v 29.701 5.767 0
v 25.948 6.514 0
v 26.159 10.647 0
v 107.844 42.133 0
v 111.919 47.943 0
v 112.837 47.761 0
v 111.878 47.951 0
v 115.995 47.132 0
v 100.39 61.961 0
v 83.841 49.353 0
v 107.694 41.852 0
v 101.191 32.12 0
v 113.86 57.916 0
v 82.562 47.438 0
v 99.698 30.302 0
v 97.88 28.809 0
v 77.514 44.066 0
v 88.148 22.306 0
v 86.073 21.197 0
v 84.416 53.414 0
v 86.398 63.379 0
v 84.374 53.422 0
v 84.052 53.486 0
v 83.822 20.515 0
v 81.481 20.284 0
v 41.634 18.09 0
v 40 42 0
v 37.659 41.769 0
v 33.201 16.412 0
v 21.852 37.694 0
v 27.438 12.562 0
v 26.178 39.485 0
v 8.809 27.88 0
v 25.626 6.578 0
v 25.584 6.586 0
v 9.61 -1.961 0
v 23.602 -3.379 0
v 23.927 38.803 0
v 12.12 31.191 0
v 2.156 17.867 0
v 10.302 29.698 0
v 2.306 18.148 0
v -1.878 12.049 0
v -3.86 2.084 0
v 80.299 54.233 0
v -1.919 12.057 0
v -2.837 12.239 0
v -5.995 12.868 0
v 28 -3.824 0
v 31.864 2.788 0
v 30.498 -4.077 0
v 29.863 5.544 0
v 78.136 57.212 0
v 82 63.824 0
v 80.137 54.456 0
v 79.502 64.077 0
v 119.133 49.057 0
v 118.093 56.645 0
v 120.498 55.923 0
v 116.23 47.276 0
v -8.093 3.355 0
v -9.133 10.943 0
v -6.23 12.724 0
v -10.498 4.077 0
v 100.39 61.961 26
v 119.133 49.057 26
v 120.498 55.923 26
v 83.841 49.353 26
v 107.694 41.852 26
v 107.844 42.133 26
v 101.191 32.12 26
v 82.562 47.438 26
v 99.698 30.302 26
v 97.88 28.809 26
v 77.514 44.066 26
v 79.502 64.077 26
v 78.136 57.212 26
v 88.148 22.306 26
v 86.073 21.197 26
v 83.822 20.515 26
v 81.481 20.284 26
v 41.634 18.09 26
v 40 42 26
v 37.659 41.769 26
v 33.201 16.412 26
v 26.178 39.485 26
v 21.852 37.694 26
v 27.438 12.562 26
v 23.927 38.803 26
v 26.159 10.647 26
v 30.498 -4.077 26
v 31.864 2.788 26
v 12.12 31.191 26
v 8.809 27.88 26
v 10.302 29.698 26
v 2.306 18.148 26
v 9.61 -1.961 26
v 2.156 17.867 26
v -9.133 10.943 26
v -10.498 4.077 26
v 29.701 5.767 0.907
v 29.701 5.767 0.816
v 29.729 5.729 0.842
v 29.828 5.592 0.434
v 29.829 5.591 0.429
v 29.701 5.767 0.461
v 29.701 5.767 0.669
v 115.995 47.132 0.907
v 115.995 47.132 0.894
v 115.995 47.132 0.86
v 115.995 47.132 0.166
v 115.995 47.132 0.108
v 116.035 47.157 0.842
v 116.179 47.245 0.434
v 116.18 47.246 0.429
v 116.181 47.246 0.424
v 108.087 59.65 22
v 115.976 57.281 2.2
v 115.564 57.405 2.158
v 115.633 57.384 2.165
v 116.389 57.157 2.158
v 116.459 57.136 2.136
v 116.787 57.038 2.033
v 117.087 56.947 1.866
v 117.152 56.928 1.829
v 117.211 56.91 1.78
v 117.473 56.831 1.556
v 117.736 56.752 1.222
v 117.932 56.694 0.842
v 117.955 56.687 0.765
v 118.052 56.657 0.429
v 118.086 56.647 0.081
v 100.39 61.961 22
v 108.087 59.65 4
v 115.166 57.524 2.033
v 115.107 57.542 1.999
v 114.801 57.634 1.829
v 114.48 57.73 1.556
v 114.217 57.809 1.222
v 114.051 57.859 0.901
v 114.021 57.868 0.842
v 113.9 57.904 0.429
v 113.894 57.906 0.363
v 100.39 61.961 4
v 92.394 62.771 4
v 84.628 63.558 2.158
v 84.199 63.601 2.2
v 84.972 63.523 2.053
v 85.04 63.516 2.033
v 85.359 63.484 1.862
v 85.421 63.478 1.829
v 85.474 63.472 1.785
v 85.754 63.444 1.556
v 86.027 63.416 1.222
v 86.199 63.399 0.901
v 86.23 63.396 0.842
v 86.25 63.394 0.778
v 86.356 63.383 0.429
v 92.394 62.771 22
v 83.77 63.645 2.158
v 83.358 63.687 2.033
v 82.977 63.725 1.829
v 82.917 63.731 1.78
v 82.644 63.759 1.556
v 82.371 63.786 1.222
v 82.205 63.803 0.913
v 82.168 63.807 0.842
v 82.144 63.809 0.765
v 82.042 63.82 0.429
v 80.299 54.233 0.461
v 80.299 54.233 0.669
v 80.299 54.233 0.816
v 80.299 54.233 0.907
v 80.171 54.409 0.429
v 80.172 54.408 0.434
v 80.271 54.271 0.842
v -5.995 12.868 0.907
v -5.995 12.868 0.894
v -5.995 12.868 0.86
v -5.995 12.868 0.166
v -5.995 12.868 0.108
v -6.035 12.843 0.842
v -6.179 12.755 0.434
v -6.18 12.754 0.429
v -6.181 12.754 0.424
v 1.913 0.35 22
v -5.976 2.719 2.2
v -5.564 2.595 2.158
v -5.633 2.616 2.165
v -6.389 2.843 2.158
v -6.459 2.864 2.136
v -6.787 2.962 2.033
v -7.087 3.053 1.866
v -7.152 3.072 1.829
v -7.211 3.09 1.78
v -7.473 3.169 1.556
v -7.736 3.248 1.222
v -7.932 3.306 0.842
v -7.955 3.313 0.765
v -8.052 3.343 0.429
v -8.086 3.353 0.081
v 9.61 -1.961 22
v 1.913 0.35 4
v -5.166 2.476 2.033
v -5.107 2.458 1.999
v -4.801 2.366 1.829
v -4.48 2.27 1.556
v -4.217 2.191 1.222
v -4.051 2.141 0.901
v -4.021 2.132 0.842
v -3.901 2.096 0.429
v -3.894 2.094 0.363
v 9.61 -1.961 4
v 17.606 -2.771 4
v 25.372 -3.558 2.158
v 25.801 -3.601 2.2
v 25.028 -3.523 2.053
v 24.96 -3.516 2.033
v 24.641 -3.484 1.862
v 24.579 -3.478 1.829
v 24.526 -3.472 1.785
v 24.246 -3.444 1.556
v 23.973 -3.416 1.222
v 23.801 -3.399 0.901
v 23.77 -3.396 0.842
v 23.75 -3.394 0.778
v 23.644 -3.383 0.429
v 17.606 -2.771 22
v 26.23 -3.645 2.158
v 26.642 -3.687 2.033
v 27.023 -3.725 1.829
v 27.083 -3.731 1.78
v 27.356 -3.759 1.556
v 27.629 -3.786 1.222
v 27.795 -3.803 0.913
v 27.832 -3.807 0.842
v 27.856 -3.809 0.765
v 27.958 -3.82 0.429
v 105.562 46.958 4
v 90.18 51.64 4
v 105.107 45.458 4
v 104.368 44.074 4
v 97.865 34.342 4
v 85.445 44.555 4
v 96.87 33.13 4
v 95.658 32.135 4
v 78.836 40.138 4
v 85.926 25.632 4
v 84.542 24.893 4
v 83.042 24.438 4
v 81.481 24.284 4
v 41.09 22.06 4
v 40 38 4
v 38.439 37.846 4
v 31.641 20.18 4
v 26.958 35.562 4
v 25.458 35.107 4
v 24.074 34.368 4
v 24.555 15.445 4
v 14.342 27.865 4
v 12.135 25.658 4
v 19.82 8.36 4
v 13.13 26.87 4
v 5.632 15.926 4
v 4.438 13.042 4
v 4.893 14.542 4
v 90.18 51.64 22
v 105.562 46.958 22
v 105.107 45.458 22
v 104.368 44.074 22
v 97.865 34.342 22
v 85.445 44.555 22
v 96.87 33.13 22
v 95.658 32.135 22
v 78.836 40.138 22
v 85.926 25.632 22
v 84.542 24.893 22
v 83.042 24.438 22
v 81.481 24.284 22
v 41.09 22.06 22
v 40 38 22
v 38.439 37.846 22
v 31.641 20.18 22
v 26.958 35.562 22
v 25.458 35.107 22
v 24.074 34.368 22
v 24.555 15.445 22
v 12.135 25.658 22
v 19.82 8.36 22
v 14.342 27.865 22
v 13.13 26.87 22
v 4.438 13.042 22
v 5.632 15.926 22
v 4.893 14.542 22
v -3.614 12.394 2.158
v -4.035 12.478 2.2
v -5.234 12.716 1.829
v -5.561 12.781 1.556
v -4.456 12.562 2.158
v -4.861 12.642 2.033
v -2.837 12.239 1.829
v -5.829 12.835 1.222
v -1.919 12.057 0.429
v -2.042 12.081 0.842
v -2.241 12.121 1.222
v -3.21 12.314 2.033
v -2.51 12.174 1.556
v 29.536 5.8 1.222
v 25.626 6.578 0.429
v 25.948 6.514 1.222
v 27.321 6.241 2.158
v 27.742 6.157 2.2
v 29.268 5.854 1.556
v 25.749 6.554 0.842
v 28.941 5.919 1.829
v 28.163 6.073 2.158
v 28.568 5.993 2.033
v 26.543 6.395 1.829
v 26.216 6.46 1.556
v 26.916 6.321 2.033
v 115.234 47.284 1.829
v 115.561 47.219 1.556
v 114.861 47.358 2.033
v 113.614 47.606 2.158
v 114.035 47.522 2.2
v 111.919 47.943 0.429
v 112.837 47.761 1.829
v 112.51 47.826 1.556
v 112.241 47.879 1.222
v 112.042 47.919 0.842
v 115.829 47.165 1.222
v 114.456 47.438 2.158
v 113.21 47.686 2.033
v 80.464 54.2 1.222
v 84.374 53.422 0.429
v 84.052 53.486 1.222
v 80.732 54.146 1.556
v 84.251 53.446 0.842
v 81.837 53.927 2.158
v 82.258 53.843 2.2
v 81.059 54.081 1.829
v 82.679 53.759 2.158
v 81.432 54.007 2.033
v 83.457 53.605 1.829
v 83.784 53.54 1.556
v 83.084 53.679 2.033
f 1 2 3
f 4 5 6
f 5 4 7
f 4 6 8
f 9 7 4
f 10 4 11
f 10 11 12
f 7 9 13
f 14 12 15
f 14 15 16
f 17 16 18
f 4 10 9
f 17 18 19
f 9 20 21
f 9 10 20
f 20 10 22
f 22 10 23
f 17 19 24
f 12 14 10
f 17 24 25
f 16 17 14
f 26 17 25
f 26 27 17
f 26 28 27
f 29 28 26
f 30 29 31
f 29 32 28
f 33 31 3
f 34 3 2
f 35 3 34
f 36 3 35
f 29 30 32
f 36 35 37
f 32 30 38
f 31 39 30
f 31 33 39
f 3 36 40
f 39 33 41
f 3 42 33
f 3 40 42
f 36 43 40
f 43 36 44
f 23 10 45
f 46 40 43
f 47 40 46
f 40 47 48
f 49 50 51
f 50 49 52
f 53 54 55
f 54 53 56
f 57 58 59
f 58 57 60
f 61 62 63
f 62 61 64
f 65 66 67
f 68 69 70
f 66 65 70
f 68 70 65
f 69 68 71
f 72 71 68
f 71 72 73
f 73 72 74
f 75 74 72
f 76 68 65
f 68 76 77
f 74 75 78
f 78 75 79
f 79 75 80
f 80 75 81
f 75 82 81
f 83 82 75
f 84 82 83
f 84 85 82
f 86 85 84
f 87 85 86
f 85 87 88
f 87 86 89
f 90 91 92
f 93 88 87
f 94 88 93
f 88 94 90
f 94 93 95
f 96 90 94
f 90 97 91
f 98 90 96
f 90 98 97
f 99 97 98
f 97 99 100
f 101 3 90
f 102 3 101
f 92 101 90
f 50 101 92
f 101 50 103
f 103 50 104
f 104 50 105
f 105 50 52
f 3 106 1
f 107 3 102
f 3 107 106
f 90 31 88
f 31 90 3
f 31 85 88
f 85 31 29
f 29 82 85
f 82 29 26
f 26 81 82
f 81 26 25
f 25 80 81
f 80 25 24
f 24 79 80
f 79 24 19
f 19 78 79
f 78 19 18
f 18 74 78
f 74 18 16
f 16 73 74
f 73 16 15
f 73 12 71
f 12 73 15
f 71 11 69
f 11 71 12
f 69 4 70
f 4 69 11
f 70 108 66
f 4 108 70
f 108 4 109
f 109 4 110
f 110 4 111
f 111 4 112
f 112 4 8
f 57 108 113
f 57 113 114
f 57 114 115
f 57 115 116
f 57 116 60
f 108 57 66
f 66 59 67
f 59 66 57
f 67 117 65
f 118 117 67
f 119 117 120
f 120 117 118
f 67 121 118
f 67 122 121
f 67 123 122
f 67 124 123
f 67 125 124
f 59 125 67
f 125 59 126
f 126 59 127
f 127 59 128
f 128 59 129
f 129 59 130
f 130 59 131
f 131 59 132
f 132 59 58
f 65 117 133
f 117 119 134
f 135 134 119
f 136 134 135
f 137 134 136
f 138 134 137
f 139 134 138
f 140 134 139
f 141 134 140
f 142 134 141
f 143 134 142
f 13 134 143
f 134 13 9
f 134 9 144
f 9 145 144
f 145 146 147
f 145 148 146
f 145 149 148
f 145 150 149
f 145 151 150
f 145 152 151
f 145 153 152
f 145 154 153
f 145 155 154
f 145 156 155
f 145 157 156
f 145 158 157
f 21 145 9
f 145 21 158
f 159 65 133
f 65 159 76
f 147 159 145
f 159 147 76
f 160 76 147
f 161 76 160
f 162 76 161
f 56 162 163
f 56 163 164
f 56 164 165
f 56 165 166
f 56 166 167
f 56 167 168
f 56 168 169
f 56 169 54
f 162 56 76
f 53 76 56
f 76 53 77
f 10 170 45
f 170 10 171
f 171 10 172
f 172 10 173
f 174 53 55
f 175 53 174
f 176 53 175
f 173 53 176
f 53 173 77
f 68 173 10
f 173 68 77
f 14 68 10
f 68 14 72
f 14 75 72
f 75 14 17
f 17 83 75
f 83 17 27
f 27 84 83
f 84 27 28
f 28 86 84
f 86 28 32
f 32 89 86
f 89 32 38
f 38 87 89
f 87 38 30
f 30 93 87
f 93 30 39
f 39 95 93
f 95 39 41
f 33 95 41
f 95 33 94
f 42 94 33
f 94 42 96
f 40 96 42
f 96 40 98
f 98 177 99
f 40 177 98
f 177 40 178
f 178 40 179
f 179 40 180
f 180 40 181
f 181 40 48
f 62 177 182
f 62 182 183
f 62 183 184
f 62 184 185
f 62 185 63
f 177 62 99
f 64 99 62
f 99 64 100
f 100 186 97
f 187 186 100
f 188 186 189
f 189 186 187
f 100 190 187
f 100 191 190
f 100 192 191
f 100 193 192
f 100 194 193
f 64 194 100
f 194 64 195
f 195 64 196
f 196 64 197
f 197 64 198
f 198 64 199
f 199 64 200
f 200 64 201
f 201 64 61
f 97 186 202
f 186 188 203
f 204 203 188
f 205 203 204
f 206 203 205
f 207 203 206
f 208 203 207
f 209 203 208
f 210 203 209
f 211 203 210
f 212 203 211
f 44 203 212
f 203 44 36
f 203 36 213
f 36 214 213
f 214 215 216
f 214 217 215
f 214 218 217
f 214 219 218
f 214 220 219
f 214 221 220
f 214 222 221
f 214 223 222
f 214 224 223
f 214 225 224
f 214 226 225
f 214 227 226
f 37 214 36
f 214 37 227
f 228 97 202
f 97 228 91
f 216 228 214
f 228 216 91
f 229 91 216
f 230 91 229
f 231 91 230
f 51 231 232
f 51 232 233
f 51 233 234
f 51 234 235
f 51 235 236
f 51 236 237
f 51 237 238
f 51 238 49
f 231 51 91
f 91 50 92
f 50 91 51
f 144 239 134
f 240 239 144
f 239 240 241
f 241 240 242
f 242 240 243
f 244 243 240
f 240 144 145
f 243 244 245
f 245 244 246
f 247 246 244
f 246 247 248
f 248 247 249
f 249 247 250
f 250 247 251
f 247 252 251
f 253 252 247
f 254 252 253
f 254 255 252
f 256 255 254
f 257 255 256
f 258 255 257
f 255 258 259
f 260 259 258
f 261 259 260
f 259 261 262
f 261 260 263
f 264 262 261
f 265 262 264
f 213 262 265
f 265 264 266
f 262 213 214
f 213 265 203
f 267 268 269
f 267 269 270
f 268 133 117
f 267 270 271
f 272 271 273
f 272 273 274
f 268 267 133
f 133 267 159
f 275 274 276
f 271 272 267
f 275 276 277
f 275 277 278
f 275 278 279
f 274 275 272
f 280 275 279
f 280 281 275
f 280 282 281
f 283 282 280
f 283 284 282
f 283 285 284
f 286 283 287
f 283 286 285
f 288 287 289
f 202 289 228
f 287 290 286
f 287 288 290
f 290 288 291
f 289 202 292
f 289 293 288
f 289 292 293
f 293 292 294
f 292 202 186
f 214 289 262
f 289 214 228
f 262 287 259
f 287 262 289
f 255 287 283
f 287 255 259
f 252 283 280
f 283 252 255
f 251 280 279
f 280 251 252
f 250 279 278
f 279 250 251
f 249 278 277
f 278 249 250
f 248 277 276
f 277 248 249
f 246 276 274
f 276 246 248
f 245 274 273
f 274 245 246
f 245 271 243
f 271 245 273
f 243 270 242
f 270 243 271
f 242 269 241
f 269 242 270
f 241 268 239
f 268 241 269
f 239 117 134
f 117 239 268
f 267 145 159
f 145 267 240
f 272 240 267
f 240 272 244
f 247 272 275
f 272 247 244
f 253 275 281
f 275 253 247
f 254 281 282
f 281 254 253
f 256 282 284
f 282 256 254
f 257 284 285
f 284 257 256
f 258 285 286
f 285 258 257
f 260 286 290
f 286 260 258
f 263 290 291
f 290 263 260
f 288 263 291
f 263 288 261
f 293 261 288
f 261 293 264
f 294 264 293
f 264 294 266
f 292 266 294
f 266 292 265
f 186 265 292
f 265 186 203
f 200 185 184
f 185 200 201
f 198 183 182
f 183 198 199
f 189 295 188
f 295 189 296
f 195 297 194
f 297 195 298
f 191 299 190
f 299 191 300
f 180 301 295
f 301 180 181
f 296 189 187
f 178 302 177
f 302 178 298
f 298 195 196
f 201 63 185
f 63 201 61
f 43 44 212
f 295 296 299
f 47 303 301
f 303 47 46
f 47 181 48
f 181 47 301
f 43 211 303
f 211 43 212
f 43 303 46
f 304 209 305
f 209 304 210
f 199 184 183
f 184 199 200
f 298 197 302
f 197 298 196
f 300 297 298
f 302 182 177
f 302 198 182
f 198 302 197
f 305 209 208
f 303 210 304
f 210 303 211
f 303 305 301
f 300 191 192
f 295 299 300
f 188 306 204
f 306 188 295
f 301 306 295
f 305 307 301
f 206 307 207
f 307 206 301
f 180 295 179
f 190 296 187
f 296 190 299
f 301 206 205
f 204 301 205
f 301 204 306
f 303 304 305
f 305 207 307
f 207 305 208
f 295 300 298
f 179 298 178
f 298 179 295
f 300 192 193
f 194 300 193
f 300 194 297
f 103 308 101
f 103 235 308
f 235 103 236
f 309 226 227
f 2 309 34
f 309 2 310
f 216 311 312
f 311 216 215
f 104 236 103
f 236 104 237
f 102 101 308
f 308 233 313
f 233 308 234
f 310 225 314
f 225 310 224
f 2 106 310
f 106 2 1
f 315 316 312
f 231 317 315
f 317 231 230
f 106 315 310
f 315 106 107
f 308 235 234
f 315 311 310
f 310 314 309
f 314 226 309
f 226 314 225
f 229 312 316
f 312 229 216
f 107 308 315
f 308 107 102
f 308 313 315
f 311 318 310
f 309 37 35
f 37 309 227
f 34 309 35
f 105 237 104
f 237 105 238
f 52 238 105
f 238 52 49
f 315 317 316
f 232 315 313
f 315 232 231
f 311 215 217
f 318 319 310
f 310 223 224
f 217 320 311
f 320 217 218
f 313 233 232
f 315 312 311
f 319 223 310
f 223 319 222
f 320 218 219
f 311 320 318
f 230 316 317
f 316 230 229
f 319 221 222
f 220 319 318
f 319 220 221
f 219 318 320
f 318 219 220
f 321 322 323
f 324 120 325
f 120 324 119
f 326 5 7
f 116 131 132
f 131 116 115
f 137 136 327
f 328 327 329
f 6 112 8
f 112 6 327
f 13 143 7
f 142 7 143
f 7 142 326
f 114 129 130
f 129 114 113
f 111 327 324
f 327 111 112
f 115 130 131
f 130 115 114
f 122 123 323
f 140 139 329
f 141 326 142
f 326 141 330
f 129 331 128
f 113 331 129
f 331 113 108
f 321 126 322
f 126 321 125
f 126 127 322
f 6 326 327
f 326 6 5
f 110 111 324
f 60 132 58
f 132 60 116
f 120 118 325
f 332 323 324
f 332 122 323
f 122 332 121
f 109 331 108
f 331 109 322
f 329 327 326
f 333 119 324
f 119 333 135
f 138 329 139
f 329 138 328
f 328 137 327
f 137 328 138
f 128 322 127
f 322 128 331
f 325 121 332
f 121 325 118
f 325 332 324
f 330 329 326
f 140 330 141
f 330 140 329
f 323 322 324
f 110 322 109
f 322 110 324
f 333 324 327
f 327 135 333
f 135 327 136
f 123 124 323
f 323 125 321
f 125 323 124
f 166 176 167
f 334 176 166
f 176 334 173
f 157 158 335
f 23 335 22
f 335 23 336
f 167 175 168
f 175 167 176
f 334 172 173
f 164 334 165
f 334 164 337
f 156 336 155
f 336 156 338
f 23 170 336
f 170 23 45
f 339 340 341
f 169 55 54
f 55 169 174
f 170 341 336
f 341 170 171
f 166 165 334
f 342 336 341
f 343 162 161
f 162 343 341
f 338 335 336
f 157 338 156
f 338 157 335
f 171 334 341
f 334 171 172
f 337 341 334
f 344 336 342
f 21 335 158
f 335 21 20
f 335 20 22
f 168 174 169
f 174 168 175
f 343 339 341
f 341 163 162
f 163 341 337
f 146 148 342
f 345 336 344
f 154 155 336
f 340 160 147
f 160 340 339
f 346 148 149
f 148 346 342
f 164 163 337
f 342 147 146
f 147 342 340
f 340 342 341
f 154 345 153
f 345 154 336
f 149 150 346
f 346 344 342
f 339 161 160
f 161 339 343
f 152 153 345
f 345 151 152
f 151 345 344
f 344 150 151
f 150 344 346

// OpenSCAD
$fn = 32;

// ----------------------------------------------------------------------
// Air duct: 24 mm duct, 4 mm wall, 26 mm across
// ----------------------------------------------------------------------

// --- parameters (mm) ---
duct_r = 12;              // duct core radius
duct_d = 24;              // duct core diameter
wall = 4;                 // duct wall thickness
height = 26;              // duct width (extrusion height)
port_r = 20.9;            // port flange half width
port_d = 41.8;            // port flange width
port_t = 7;               // port flange thickness
bolt_d = 4.4;             // port bolt holes
bolt_offset = 16.2;       // bolt hole offset from the port axis

difference() {
  /* outer hull chain: tube with a flat flange plate at every port */
  linear_extrude(height = 26) {
    hull() {
      polygon([[30.498, -4.077], [-10.498, 4.077], [-9.133, 10.943], [31.864, 2.788]]);
      translate([11.951, 9.808]) circle(r = 12);
    }
    hull() {
      translate([11.951, 9.808]) circle(r = 12);
      translate([12.284, 11.481]) circle(r = 12);
    }
    hull() {
      translate([12.284, 11.481]) circle(r = 12);
      translate([18.787, 21.213]) circle(r = 12);
    }
    hull() {
      translate([18.787, 21.213]) circle(r = 12);
      translate([28.519, 27.716]) circle(r = 12);
    }
    hull() {
      translate([28.519, 27.716]) circle(r = 12);
      translate([40, 30]) circle(r = 12);
    }
    hull() {
      translate([40, 30]) circle(r = 12);
      translate([81.481, 32.284]) circle(r = 12);
    }
    hull() {
      translate([81.481, 32.284]) circle(r = 12);
      translate([91.213, 38.787]) circle(r = 12);
    }
    hull() {
      translate([91.213, 38.787]) circle(r = 12);
      translate([97.716, 48.519]) circle(r = 12);
    }
    hull() {
      translate([97.716, 48.519]) circle(r = 12);
      translate([98.049, 50.192]) circle(r = 12);
    }
    hull() {
      translate([98.049, 50.192]) circle(r = 12);
      polygon([[79.502, 64.077], [120.498, 55.923], [119.133, 49.057], [78.136, 57.212]]);
    }
  }
  /* air passage: the same chain inset by the wall, 5 mm proud of the ports */
  translate([0, 0, 4]) linear_extrude(height = 18) {
    hull() {
      translate([9.025, -4.904]) circle(r = 8);
      translate([12.284, 11.481]) circle(r = 8);
    }
    hull() {
      translate([12.284, 11.481]) circle(r = 8);
      translate([18.787, 21.213]) circle(r = 8);
    }
    hull() {
      translate([18.787, 21.213]) circle(r = 8);
      translate([28.519, 27.716]) circle(r = 8);
    }
    hull() {
      translate([28.519, 27.716]) circle(r = 8);
      translate([40, 30]) circle(r = 8);
    }
    hull() {
      translate([40, 30]) circle(r = 8);
      translate([81.481, 32.284]) circle(r = 8);
    }
    hull() {
      translate([81.481, 32.284]) circle(r = 8);
      translate([91.213, 38.787]) circle(r = 8);
    }
    hull() {
      translate([91.213, 38.787]) circle(r = 8);
      translate([97.716, 48.519]) circle(r = 8);
    }
    hull() {
      translate([97.716, 48.519]) circle(r = 8);
      translate([100.975, 64.904]) circle(r = 8);
    }
  }
  translate([10, 0]) rotate([0, 0, -11.25]) translate([-16.2, -2.5]) rotate([-90, 0, 0]) cylinder(h = 12, d = 4.4);
  translate([10, 0]) rotate([0, 0, -11.25]) translate([16.2, -2.5]) rotate([-90, 0, 0]) cylinder(h = 12, d = 4.4);
  translate([100, 60]) rotate([0, 0, 168.75]) translate([-16.2, -2.5]) rotate([-90, 0, 0]) cylinder(h = 12, d = 4.4);
  translate([100, 60]) rotate([0, 0, 168.75]) translate([16.2, -2.5]) rotate([-90, 0, 0]) cylinder(h = 12, d = 4.4);
}
